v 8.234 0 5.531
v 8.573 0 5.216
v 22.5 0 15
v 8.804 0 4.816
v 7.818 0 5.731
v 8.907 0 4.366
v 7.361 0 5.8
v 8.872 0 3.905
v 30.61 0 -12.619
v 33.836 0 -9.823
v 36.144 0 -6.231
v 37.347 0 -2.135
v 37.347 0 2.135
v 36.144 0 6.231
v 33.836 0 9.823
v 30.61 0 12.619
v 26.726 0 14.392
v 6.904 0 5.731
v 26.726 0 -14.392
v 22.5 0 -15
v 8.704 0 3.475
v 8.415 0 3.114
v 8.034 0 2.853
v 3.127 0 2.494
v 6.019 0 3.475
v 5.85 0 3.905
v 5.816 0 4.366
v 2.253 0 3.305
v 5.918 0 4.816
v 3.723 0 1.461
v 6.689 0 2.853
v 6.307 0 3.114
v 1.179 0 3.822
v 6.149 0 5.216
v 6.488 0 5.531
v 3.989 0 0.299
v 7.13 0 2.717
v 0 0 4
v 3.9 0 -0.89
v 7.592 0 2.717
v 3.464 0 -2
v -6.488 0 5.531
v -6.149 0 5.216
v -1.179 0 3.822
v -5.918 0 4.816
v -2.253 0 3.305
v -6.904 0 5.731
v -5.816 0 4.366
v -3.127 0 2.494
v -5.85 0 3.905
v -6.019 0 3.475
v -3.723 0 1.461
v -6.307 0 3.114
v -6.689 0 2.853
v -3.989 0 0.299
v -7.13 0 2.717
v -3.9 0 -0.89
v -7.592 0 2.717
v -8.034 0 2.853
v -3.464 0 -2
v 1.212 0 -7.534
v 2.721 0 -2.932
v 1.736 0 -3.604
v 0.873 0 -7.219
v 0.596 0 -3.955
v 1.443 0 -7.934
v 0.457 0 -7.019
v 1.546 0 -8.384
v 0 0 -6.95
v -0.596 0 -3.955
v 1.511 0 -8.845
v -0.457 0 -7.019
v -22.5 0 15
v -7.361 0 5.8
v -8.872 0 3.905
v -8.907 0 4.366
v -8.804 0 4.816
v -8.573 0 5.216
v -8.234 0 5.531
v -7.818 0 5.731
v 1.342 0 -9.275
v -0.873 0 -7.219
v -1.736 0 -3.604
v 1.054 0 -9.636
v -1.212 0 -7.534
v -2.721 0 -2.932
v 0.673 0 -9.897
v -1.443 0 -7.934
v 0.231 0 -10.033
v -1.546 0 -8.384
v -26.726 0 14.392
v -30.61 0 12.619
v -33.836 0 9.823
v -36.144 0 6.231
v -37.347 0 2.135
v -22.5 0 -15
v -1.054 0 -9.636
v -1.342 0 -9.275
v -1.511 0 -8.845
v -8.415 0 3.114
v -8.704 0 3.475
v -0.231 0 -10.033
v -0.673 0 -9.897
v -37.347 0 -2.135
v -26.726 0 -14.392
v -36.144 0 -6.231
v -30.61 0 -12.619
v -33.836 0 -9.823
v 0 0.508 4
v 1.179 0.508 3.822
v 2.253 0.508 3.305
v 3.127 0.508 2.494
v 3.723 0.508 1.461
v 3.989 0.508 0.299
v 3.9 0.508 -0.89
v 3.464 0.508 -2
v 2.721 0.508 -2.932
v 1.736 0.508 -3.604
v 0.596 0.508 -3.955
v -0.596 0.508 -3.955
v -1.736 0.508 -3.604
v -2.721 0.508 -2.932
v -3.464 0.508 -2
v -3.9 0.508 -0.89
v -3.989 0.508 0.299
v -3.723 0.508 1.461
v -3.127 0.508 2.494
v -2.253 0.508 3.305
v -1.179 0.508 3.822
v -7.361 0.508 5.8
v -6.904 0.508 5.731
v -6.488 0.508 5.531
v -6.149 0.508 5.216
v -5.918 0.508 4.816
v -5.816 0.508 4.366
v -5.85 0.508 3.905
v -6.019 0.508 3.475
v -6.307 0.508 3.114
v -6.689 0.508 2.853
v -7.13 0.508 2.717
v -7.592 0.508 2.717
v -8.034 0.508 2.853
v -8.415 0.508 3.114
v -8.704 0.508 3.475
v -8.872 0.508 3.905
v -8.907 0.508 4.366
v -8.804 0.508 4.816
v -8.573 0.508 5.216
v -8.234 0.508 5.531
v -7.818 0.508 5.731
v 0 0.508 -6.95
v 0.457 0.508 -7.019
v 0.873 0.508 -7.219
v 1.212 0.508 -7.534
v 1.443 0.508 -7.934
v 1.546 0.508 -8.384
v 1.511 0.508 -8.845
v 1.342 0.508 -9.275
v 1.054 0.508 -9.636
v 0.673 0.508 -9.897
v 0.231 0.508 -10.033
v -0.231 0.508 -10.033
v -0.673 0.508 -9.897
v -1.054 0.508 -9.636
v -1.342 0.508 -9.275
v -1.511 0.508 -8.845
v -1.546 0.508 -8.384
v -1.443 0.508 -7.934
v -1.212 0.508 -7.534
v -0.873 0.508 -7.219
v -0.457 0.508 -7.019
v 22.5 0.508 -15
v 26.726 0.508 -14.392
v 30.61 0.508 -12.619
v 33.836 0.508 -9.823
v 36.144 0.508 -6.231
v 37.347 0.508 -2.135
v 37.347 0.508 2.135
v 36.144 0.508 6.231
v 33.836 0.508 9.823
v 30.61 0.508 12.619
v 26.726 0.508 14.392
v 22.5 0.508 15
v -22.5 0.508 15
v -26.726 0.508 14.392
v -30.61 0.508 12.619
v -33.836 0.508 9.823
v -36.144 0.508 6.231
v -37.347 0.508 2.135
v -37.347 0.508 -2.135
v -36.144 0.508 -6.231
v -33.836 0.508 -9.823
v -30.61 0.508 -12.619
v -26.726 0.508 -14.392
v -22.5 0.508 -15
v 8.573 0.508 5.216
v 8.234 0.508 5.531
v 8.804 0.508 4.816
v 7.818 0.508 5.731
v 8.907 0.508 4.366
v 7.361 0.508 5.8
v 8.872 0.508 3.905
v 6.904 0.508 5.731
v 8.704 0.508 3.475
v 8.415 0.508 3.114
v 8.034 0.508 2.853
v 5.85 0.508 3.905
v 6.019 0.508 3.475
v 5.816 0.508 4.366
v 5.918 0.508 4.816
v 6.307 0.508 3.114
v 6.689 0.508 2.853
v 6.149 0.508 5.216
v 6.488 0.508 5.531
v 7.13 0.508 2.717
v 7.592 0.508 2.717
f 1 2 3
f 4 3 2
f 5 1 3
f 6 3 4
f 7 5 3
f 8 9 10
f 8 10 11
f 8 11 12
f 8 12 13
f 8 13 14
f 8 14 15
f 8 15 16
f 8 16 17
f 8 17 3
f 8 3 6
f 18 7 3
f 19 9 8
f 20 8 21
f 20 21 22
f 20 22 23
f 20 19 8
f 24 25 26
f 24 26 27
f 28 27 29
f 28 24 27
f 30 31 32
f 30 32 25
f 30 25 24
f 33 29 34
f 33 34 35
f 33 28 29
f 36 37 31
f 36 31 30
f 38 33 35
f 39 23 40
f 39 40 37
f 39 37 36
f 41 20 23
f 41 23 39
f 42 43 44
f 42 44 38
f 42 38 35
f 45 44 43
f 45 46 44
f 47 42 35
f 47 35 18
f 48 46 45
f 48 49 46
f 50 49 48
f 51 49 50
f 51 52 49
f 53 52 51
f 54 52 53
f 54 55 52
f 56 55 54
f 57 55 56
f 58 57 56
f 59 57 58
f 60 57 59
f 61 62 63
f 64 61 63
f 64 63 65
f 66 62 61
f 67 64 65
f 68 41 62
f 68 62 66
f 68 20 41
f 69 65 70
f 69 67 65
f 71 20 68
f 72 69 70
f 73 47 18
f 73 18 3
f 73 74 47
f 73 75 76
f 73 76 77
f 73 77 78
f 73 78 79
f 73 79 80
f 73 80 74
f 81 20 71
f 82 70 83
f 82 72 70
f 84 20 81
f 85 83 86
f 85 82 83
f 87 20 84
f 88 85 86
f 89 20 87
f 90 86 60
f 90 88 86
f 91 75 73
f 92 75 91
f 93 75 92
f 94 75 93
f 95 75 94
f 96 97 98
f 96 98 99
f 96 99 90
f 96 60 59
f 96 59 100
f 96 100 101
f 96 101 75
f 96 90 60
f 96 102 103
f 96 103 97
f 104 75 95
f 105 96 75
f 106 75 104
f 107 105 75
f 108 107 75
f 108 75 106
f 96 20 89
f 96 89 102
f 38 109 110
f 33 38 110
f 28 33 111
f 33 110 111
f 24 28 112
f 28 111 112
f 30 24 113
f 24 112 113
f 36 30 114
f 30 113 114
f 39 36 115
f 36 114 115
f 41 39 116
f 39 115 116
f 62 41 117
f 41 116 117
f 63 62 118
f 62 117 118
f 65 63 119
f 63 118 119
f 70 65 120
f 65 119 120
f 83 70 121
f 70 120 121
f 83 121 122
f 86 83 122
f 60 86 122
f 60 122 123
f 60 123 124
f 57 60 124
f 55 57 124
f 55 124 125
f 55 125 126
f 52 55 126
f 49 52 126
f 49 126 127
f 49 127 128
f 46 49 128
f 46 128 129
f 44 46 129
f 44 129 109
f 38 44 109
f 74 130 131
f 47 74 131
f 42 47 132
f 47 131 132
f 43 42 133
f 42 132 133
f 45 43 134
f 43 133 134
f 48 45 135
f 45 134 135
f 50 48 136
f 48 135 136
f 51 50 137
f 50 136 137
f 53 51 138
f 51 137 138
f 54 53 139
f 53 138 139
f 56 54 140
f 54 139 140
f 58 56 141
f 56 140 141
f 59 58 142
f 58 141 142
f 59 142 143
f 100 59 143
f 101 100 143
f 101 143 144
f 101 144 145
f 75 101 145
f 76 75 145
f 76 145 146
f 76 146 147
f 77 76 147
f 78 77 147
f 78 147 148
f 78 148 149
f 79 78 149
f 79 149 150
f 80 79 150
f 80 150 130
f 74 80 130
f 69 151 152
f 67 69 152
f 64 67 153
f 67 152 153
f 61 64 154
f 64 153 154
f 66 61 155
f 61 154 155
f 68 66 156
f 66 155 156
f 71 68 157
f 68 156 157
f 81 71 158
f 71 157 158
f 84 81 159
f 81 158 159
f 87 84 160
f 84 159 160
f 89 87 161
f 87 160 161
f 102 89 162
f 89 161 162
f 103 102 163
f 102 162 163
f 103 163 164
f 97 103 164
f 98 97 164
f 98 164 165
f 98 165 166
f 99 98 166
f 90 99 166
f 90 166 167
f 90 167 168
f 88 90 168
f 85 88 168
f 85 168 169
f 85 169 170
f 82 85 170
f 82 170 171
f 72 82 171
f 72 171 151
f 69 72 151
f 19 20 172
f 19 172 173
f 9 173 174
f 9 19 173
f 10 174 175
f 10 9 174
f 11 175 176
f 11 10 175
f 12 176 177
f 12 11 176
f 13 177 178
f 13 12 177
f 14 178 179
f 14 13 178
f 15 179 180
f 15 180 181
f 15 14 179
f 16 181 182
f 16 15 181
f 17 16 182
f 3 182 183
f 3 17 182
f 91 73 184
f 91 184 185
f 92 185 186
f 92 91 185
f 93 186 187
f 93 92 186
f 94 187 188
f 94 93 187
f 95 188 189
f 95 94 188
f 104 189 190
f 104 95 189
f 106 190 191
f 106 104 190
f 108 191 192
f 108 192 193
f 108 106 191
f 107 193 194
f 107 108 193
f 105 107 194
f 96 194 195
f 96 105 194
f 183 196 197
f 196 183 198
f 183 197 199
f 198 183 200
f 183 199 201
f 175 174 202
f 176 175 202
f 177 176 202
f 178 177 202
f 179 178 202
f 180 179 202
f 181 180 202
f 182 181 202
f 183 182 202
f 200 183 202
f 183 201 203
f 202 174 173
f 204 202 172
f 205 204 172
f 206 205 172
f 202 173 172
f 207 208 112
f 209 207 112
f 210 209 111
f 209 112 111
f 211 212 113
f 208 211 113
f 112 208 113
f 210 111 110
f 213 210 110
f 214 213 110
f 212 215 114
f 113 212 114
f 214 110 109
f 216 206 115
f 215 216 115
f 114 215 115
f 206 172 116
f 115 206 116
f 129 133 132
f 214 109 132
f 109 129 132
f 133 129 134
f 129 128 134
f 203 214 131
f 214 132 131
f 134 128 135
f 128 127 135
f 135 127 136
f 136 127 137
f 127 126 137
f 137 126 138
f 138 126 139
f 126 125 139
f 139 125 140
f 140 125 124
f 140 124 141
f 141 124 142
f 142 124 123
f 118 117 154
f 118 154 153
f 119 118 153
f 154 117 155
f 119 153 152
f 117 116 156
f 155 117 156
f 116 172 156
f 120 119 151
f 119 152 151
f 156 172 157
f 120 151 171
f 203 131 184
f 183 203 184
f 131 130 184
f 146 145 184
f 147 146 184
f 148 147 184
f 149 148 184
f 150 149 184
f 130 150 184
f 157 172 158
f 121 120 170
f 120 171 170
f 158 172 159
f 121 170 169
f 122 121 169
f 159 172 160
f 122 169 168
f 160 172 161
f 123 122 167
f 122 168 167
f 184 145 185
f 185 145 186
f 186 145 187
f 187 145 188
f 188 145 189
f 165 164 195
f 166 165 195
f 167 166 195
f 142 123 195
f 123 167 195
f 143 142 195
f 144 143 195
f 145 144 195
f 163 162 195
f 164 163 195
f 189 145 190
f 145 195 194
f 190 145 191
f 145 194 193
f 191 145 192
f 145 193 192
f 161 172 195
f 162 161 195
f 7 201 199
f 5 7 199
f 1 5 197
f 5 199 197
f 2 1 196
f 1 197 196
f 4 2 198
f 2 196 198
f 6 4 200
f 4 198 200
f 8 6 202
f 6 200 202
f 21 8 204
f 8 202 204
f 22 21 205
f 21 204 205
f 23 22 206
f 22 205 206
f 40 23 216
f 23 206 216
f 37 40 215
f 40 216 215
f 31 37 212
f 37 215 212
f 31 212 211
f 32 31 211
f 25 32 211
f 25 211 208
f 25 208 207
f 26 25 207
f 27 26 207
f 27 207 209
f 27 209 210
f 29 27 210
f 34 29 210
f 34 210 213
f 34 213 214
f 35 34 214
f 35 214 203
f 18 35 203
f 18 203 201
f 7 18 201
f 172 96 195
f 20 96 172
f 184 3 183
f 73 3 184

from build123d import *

# Parameters (mm, degrees)
BOSS_EXTRUDE1_DEPTH = 0.508
SKETCH2_R           = 1.55
SKETCH2_R_2         = 4
CUT_EXTRUDE1_DEPTH  = 1.6


with BuildPart() as part:
    # Sketch1 → Boss-Extrude1 (new body)
    with BuildSketch(Plane(origin=(0, 0, 0), x_dir=(1, 0, 0), z_dir=(0, 1, 0))):
        with BuildLine():
            Line((-22.5, 15), (22.5, 15))
            ThreePointArc((22.5, 15), (37.5, 0), (22.5, -15))
            Line((22.5, -15), (-22.5, -15))
            ThreePointArc((-22.5, -15), (-37.5, 0), (-22.5, 15))
        make_face()
    extrude(amount=BOSS_EXTRUDE1_DEPTH)

    # Sketch2 → Cut-Extrude1 (cut)
    with BuildSketch(Plane(origin=(0, 0.508, 0), x_dir=(1, 0, 0), z_dir=(0, 1, 0))):
        with Locations(Location((0, 8.5, 0), (0, 0, 270))):
            Circle(SKETCH2_R)
        with Locations(Location((7.361215932, -4.25, 0), (0, 0, 270))):
            Circle(SKETCH2_R)
        with Locations(Location((-7.361215932, -4.25, 0), (0, 0, 270))):
            Circle(SKETCH2_R)
        with Locations(Location((0, 0, 0), (0, 0, 270))):
            Circle(SKETCH2_R_2)
    extrude(amount=-CUT_EXTRUDE1_DEPTH, mode=Mode.SUBTRACT)


solid = part.part
